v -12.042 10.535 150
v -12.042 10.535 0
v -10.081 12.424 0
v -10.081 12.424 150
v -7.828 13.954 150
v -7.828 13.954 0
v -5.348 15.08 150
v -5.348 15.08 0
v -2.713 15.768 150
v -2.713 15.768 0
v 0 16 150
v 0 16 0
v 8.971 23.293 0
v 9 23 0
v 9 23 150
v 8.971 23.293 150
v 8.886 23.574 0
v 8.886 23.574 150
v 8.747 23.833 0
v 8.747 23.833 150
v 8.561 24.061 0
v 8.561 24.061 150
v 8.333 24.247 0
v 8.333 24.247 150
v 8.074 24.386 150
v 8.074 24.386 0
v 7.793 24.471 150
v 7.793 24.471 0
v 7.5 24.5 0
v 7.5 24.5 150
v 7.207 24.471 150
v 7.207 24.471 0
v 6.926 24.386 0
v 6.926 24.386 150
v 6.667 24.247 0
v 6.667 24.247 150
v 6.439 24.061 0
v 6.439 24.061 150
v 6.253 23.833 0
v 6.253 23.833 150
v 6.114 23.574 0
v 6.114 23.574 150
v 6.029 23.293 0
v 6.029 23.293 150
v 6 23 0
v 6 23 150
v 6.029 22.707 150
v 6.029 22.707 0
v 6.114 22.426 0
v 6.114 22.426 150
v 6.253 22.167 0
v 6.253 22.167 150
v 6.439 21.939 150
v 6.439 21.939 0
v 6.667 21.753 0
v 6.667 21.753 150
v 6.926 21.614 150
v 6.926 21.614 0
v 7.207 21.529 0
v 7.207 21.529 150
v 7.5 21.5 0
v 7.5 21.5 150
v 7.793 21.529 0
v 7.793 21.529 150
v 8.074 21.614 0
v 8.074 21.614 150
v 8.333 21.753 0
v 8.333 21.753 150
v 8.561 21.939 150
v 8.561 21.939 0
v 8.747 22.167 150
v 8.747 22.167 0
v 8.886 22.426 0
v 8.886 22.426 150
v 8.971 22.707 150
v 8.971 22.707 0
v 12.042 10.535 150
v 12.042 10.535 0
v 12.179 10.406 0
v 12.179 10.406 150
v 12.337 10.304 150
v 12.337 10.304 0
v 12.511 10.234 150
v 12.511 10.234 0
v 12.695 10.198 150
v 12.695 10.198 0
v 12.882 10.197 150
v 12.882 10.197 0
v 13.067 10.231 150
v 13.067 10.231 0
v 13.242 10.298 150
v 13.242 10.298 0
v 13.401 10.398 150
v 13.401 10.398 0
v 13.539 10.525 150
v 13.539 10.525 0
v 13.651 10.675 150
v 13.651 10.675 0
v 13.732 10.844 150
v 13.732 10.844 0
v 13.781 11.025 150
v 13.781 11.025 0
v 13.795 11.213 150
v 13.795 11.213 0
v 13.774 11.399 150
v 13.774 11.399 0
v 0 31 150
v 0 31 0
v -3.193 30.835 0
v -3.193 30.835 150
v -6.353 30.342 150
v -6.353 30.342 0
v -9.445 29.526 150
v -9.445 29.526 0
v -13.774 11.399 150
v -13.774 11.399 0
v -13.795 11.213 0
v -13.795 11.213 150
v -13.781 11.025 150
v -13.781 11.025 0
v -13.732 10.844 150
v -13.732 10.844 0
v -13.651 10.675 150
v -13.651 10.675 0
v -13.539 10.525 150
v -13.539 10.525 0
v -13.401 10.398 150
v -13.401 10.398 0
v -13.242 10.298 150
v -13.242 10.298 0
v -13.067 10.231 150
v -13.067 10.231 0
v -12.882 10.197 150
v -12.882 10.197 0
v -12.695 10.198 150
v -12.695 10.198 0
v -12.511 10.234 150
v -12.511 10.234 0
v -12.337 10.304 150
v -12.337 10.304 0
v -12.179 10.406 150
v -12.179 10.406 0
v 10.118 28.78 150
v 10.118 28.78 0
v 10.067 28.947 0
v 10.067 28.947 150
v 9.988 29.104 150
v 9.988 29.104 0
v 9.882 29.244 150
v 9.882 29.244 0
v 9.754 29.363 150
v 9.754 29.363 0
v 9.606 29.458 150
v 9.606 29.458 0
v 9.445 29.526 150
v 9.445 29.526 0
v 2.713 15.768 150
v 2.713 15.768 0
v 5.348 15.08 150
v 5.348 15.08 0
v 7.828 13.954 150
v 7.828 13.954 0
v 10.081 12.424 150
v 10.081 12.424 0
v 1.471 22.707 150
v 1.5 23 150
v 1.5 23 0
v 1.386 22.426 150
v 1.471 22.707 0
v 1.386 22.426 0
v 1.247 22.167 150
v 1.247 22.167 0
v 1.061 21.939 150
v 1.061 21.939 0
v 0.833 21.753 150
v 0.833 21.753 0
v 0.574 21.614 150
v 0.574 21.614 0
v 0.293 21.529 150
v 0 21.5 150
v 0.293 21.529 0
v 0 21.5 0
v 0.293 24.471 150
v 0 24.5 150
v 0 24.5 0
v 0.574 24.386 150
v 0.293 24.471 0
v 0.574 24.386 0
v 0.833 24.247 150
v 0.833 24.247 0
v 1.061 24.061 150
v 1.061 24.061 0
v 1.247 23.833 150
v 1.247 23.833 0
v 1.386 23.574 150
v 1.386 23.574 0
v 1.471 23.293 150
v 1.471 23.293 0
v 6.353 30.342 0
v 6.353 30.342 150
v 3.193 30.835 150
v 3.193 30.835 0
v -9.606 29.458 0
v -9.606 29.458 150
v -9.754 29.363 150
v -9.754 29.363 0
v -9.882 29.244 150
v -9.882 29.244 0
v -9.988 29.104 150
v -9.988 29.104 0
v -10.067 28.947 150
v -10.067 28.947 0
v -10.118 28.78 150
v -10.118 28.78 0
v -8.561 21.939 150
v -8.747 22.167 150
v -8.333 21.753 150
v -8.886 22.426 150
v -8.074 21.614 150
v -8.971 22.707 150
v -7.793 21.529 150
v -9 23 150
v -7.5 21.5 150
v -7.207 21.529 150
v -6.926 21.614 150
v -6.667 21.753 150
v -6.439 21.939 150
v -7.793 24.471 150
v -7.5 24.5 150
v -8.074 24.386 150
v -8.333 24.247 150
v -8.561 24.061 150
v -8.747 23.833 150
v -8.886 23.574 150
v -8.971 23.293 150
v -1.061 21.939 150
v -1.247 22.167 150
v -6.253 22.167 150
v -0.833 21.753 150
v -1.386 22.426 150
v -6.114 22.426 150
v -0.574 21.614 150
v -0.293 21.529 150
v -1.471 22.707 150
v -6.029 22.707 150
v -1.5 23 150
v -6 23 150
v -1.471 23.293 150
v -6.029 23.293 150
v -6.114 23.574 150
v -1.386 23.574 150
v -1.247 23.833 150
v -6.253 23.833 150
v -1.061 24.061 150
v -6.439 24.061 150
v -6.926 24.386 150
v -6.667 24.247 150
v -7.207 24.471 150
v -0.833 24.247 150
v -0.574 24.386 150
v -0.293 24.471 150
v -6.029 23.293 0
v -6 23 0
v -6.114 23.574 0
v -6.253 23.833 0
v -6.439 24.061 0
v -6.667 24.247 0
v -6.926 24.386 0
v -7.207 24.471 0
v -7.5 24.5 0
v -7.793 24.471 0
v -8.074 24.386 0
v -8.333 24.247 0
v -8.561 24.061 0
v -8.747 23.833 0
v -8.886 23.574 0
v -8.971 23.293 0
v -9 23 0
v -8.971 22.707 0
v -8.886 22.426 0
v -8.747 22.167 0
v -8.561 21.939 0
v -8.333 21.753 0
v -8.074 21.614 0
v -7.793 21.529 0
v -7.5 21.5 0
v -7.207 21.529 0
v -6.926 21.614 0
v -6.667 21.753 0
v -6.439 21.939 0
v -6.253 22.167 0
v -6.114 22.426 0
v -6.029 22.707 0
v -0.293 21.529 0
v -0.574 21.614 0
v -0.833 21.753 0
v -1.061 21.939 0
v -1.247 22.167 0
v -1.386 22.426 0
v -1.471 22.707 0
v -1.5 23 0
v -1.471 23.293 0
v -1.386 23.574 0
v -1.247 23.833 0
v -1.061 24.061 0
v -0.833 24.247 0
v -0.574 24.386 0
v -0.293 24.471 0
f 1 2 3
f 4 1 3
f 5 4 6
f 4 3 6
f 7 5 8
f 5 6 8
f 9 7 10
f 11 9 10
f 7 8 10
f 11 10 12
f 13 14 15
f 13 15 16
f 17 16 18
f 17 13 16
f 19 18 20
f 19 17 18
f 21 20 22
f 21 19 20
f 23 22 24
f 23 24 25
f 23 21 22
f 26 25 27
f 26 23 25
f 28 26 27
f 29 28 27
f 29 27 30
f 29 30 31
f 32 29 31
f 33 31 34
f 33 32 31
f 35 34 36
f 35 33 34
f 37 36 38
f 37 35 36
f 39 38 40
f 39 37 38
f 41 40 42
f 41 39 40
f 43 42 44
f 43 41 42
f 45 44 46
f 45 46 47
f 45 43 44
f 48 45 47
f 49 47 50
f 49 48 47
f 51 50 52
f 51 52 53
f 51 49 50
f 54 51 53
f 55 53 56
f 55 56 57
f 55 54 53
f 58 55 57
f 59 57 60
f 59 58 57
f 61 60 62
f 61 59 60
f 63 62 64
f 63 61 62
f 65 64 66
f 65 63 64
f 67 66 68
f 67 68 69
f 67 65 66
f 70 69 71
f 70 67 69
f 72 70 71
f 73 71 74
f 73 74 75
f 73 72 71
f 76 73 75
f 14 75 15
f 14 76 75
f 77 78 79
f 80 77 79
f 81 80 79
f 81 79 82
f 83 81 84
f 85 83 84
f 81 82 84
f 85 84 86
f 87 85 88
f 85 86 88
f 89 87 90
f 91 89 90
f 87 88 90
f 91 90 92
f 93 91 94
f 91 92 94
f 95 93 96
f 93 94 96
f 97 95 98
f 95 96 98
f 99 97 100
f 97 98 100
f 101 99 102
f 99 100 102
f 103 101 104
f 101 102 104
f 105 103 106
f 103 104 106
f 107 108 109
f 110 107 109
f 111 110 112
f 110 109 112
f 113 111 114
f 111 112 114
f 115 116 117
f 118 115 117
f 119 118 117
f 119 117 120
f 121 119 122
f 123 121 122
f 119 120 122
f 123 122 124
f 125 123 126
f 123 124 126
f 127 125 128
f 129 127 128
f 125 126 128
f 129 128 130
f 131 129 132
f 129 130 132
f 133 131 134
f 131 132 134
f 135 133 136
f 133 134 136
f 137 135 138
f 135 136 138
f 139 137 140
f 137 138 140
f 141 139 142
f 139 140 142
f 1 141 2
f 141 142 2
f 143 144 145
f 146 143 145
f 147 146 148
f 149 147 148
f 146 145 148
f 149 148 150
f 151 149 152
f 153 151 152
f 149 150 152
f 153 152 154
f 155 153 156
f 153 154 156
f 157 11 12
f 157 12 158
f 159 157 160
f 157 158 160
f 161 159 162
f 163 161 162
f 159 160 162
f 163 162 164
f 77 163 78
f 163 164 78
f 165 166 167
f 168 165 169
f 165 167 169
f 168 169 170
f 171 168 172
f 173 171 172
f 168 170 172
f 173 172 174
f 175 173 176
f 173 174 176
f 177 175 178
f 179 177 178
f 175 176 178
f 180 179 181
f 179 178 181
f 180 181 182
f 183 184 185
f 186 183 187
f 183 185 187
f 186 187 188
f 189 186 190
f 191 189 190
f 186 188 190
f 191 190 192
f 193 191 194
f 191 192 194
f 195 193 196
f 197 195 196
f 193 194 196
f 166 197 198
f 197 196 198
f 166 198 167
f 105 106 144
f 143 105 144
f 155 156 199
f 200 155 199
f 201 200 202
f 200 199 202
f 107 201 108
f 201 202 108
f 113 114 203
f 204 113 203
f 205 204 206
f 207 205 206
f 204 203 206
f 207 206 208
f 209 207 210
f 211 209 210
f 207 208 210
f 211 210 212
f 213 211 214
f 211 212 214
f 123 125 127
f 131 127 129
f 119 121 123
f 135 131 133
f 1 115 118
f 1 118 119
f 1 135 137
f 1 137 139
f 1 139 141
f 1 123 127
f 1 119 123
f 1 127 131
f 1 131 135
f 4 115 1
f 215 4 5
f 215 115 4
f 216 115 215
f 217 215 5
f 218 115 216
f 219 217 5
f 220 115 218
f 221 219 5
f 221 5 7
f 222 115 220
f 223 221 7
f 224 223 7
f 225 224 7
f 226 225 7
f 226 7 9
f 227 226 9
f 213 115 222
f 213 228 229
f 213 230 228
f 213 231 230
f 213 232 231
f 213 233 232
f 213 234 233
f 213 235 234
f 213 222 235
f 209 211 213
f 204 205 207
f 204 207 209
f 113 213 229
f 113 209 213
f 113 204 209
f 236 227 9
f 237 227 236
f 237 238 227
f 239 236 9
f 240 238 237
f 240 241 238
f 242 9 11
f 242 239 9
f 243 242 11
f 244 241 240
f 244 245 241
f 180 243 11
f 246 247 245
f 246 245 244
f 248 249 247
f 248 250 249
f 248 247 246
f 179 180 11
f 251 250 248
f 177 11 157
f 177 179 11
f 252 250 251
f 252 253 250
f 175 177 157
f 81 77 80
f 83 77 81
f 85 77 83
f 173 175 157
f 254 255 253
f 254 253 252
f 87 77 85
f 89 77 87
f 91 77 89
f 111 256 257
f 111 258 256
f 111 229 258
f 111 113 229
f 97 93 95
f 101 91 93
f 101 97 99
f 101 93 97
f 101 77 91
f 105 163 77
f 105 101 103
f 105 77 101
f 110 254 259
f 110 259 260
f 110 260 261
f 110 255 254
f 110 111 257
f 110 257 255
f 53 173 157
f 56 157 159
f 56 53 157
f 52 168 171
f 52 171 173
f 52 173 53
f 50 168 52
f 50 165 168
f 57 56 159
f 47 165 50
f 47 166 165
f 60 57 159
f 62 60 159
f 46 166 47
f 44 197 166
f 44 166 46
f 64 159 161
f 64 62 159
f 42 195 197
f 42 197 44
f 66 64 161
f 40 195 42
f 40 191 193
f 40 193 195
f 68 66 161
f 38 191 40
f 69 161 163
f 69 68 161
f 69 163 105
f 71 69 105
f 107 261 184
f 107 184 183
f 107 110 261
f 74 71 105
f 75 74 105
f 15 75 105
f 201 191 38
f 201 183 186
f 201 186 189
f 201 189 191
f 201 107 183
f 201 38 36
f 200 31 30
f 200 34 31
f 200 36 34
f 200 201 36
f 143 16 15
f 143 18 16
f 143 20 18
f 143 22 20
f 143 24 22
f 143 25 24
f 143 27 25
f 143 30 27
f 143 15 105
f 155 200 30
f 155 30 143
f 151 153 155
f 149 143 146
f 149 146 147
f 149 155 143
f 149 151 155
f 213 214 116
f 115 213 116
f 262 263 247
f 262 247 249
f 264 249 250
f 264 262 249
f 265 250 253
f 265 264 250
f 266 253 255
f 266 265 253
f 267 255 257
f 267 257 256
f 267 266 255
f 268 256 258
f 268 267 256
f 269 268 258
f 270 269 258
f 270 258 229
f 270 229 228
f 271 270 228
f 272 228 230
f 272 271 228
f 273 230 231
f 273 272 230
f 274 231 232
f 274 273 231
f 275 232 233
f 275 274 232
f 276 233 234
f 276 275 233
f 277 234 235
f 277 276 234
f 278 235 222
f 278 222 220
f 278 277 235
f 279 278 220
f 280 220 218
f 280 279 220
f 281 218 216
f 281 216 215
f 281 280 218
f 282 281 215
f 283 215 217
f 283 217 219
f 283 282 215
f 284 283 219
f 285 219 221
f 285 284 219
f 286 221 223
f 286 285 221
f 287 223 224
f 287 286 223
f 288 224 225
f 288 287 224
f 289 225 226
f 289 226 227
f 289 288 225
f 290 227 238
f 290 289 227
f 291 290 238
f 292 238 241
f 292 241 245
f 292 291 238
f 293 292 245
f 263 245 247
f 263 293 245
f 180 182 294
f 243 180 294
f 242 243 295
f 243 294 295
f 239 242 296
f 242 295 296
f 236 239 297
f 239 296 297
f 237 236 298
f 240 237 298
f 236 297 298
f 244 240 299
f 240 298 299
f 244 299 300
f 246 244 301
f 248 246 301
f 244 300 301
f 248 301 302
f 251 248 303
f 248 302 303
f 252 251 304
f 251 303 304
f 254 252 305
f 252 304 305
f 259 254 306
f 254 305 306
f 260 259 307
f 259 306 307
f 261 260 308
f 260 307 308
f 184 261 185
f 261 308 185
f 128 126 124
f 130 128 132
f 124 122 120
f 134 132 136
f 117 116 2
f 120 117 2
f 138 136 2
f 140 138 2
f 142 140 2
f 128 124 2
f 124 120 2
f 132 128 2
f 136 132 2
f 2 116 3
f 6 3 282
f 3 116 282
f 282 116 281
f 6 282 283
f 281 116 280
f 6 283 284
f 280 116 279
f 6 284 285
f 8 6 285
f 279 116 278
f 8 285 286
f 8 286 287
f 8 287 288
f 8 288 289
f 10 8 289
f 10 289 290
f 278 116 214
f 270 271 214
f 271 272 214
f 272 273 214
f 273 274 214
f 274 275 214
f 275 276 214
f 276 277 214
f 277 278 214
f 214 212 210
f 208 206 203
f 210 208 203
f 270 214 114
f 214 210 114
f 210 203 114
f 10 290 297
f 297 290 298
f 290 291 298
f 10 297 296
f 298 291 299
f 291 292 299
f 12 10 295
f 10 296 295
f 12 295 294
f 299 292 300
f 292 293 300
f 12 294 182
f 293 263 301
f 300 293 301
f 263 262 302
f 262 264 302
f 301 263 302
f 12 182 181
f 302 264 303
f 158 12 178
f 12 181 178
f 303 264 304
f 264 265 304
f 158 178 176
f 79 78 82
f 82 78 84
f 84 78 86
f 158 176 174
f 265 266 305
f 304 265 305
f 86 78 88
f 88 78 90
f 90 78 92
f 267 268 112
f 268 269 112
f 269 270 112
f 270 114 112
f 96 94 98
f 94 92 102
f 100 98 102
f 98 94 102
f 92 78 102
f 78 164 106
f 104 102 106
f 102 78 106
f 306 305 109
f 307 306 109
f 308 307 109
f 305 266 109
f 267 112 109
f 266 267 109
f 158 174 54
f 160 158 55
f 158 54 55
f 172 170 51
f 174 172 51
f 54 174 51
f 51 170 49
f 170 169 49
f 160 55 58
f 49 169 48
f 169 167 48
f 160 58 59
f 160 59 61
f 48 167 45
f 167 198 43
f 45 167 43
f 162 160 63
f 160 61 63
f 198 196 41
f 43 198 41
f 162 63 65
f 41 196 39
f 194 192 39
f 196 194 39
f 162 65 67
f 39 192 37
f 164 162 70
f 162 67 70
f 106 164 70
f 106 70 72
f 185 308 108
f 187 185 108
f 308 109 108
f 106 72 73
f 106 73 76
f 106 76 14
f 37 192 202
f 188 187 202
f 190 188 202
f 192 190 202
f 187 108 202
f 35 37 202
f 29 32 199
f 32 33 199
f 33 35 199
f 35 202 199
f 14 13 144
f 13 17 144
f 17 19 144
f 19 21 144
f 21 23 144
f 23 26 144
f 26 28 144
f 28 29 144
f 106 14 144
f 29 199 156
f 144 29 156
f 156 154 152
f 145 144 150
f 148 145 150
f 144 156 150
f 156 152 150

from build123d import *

# Parameters (mm, degrees)
F0_R     = 1.5
F1_DEPTH = 150


with BuildPart() as f1:
    # F0 (on Top) → F1 (new body)
    with BuildSketch(Plane.XY):
        with BuildLine():
            ThreePointArc((0, 16), (6.612297, 14.569747), (12.042437, 10.534691))
            ThreePointArc((12.042437, 10.534691), (13.241723, 10.298392), (13.773683, 11.398912))
            Line((13.773683, 11.398912), (10.118439, 28.779623))
            ThreePointArc((10.118439, 28.779623), (9.88218, 29.24385), (9.444507, 29.526281))
            ThreePointArc((9.444507, 29.526281), (4.779397, 30.629355), (0, 31))
            Line((0, 31), (0, 24.5))
            ThreePointArc((0, 24.5), (1.06066, 24.06066), (1.5, 23))
            ThreePointArc((1.5, 23), (1.06066, 21.93934), (0, 21.5))
            Line((0, 21.5), (0, 16))
        make_face()
        with Locations((7.5, 23)):
            Circle(F0_R, mode=Mode.SUBTRACT)
        with BuildLine():
            ThreePointArc((-12.042437, 10.534691), (-6.612297, 14.569747), (0, 16))
            Line((0, 16), (0, 21.5))
            ThreePointArc((0, 21.5), (-1.5, 23), (0, 24.5))
            Line((0, 24.5), (0, 31))
            ThreePointArc((0, 31), (-4.779397, 30.629355), (-9.444507, 29.526281))
            ThreePointArc((-9.444507, 29.526281), (-9.88218, 29.24385), (-10.118439, 28.779623))
            Line((-10.118439, 28.779623), (-13.773683, 11.398912))
            ThreePointArc((-13.773683, 11.398912), (-13.241723, 10.298392), (-12.042437, 10.534691))
        make_face()
        with Locations((-7.5, 23)):
            Circle(F0_R, mode=Mode.SUBTRACT)
    extrude(amount=F1_DEPTH)


solid = f1.part
